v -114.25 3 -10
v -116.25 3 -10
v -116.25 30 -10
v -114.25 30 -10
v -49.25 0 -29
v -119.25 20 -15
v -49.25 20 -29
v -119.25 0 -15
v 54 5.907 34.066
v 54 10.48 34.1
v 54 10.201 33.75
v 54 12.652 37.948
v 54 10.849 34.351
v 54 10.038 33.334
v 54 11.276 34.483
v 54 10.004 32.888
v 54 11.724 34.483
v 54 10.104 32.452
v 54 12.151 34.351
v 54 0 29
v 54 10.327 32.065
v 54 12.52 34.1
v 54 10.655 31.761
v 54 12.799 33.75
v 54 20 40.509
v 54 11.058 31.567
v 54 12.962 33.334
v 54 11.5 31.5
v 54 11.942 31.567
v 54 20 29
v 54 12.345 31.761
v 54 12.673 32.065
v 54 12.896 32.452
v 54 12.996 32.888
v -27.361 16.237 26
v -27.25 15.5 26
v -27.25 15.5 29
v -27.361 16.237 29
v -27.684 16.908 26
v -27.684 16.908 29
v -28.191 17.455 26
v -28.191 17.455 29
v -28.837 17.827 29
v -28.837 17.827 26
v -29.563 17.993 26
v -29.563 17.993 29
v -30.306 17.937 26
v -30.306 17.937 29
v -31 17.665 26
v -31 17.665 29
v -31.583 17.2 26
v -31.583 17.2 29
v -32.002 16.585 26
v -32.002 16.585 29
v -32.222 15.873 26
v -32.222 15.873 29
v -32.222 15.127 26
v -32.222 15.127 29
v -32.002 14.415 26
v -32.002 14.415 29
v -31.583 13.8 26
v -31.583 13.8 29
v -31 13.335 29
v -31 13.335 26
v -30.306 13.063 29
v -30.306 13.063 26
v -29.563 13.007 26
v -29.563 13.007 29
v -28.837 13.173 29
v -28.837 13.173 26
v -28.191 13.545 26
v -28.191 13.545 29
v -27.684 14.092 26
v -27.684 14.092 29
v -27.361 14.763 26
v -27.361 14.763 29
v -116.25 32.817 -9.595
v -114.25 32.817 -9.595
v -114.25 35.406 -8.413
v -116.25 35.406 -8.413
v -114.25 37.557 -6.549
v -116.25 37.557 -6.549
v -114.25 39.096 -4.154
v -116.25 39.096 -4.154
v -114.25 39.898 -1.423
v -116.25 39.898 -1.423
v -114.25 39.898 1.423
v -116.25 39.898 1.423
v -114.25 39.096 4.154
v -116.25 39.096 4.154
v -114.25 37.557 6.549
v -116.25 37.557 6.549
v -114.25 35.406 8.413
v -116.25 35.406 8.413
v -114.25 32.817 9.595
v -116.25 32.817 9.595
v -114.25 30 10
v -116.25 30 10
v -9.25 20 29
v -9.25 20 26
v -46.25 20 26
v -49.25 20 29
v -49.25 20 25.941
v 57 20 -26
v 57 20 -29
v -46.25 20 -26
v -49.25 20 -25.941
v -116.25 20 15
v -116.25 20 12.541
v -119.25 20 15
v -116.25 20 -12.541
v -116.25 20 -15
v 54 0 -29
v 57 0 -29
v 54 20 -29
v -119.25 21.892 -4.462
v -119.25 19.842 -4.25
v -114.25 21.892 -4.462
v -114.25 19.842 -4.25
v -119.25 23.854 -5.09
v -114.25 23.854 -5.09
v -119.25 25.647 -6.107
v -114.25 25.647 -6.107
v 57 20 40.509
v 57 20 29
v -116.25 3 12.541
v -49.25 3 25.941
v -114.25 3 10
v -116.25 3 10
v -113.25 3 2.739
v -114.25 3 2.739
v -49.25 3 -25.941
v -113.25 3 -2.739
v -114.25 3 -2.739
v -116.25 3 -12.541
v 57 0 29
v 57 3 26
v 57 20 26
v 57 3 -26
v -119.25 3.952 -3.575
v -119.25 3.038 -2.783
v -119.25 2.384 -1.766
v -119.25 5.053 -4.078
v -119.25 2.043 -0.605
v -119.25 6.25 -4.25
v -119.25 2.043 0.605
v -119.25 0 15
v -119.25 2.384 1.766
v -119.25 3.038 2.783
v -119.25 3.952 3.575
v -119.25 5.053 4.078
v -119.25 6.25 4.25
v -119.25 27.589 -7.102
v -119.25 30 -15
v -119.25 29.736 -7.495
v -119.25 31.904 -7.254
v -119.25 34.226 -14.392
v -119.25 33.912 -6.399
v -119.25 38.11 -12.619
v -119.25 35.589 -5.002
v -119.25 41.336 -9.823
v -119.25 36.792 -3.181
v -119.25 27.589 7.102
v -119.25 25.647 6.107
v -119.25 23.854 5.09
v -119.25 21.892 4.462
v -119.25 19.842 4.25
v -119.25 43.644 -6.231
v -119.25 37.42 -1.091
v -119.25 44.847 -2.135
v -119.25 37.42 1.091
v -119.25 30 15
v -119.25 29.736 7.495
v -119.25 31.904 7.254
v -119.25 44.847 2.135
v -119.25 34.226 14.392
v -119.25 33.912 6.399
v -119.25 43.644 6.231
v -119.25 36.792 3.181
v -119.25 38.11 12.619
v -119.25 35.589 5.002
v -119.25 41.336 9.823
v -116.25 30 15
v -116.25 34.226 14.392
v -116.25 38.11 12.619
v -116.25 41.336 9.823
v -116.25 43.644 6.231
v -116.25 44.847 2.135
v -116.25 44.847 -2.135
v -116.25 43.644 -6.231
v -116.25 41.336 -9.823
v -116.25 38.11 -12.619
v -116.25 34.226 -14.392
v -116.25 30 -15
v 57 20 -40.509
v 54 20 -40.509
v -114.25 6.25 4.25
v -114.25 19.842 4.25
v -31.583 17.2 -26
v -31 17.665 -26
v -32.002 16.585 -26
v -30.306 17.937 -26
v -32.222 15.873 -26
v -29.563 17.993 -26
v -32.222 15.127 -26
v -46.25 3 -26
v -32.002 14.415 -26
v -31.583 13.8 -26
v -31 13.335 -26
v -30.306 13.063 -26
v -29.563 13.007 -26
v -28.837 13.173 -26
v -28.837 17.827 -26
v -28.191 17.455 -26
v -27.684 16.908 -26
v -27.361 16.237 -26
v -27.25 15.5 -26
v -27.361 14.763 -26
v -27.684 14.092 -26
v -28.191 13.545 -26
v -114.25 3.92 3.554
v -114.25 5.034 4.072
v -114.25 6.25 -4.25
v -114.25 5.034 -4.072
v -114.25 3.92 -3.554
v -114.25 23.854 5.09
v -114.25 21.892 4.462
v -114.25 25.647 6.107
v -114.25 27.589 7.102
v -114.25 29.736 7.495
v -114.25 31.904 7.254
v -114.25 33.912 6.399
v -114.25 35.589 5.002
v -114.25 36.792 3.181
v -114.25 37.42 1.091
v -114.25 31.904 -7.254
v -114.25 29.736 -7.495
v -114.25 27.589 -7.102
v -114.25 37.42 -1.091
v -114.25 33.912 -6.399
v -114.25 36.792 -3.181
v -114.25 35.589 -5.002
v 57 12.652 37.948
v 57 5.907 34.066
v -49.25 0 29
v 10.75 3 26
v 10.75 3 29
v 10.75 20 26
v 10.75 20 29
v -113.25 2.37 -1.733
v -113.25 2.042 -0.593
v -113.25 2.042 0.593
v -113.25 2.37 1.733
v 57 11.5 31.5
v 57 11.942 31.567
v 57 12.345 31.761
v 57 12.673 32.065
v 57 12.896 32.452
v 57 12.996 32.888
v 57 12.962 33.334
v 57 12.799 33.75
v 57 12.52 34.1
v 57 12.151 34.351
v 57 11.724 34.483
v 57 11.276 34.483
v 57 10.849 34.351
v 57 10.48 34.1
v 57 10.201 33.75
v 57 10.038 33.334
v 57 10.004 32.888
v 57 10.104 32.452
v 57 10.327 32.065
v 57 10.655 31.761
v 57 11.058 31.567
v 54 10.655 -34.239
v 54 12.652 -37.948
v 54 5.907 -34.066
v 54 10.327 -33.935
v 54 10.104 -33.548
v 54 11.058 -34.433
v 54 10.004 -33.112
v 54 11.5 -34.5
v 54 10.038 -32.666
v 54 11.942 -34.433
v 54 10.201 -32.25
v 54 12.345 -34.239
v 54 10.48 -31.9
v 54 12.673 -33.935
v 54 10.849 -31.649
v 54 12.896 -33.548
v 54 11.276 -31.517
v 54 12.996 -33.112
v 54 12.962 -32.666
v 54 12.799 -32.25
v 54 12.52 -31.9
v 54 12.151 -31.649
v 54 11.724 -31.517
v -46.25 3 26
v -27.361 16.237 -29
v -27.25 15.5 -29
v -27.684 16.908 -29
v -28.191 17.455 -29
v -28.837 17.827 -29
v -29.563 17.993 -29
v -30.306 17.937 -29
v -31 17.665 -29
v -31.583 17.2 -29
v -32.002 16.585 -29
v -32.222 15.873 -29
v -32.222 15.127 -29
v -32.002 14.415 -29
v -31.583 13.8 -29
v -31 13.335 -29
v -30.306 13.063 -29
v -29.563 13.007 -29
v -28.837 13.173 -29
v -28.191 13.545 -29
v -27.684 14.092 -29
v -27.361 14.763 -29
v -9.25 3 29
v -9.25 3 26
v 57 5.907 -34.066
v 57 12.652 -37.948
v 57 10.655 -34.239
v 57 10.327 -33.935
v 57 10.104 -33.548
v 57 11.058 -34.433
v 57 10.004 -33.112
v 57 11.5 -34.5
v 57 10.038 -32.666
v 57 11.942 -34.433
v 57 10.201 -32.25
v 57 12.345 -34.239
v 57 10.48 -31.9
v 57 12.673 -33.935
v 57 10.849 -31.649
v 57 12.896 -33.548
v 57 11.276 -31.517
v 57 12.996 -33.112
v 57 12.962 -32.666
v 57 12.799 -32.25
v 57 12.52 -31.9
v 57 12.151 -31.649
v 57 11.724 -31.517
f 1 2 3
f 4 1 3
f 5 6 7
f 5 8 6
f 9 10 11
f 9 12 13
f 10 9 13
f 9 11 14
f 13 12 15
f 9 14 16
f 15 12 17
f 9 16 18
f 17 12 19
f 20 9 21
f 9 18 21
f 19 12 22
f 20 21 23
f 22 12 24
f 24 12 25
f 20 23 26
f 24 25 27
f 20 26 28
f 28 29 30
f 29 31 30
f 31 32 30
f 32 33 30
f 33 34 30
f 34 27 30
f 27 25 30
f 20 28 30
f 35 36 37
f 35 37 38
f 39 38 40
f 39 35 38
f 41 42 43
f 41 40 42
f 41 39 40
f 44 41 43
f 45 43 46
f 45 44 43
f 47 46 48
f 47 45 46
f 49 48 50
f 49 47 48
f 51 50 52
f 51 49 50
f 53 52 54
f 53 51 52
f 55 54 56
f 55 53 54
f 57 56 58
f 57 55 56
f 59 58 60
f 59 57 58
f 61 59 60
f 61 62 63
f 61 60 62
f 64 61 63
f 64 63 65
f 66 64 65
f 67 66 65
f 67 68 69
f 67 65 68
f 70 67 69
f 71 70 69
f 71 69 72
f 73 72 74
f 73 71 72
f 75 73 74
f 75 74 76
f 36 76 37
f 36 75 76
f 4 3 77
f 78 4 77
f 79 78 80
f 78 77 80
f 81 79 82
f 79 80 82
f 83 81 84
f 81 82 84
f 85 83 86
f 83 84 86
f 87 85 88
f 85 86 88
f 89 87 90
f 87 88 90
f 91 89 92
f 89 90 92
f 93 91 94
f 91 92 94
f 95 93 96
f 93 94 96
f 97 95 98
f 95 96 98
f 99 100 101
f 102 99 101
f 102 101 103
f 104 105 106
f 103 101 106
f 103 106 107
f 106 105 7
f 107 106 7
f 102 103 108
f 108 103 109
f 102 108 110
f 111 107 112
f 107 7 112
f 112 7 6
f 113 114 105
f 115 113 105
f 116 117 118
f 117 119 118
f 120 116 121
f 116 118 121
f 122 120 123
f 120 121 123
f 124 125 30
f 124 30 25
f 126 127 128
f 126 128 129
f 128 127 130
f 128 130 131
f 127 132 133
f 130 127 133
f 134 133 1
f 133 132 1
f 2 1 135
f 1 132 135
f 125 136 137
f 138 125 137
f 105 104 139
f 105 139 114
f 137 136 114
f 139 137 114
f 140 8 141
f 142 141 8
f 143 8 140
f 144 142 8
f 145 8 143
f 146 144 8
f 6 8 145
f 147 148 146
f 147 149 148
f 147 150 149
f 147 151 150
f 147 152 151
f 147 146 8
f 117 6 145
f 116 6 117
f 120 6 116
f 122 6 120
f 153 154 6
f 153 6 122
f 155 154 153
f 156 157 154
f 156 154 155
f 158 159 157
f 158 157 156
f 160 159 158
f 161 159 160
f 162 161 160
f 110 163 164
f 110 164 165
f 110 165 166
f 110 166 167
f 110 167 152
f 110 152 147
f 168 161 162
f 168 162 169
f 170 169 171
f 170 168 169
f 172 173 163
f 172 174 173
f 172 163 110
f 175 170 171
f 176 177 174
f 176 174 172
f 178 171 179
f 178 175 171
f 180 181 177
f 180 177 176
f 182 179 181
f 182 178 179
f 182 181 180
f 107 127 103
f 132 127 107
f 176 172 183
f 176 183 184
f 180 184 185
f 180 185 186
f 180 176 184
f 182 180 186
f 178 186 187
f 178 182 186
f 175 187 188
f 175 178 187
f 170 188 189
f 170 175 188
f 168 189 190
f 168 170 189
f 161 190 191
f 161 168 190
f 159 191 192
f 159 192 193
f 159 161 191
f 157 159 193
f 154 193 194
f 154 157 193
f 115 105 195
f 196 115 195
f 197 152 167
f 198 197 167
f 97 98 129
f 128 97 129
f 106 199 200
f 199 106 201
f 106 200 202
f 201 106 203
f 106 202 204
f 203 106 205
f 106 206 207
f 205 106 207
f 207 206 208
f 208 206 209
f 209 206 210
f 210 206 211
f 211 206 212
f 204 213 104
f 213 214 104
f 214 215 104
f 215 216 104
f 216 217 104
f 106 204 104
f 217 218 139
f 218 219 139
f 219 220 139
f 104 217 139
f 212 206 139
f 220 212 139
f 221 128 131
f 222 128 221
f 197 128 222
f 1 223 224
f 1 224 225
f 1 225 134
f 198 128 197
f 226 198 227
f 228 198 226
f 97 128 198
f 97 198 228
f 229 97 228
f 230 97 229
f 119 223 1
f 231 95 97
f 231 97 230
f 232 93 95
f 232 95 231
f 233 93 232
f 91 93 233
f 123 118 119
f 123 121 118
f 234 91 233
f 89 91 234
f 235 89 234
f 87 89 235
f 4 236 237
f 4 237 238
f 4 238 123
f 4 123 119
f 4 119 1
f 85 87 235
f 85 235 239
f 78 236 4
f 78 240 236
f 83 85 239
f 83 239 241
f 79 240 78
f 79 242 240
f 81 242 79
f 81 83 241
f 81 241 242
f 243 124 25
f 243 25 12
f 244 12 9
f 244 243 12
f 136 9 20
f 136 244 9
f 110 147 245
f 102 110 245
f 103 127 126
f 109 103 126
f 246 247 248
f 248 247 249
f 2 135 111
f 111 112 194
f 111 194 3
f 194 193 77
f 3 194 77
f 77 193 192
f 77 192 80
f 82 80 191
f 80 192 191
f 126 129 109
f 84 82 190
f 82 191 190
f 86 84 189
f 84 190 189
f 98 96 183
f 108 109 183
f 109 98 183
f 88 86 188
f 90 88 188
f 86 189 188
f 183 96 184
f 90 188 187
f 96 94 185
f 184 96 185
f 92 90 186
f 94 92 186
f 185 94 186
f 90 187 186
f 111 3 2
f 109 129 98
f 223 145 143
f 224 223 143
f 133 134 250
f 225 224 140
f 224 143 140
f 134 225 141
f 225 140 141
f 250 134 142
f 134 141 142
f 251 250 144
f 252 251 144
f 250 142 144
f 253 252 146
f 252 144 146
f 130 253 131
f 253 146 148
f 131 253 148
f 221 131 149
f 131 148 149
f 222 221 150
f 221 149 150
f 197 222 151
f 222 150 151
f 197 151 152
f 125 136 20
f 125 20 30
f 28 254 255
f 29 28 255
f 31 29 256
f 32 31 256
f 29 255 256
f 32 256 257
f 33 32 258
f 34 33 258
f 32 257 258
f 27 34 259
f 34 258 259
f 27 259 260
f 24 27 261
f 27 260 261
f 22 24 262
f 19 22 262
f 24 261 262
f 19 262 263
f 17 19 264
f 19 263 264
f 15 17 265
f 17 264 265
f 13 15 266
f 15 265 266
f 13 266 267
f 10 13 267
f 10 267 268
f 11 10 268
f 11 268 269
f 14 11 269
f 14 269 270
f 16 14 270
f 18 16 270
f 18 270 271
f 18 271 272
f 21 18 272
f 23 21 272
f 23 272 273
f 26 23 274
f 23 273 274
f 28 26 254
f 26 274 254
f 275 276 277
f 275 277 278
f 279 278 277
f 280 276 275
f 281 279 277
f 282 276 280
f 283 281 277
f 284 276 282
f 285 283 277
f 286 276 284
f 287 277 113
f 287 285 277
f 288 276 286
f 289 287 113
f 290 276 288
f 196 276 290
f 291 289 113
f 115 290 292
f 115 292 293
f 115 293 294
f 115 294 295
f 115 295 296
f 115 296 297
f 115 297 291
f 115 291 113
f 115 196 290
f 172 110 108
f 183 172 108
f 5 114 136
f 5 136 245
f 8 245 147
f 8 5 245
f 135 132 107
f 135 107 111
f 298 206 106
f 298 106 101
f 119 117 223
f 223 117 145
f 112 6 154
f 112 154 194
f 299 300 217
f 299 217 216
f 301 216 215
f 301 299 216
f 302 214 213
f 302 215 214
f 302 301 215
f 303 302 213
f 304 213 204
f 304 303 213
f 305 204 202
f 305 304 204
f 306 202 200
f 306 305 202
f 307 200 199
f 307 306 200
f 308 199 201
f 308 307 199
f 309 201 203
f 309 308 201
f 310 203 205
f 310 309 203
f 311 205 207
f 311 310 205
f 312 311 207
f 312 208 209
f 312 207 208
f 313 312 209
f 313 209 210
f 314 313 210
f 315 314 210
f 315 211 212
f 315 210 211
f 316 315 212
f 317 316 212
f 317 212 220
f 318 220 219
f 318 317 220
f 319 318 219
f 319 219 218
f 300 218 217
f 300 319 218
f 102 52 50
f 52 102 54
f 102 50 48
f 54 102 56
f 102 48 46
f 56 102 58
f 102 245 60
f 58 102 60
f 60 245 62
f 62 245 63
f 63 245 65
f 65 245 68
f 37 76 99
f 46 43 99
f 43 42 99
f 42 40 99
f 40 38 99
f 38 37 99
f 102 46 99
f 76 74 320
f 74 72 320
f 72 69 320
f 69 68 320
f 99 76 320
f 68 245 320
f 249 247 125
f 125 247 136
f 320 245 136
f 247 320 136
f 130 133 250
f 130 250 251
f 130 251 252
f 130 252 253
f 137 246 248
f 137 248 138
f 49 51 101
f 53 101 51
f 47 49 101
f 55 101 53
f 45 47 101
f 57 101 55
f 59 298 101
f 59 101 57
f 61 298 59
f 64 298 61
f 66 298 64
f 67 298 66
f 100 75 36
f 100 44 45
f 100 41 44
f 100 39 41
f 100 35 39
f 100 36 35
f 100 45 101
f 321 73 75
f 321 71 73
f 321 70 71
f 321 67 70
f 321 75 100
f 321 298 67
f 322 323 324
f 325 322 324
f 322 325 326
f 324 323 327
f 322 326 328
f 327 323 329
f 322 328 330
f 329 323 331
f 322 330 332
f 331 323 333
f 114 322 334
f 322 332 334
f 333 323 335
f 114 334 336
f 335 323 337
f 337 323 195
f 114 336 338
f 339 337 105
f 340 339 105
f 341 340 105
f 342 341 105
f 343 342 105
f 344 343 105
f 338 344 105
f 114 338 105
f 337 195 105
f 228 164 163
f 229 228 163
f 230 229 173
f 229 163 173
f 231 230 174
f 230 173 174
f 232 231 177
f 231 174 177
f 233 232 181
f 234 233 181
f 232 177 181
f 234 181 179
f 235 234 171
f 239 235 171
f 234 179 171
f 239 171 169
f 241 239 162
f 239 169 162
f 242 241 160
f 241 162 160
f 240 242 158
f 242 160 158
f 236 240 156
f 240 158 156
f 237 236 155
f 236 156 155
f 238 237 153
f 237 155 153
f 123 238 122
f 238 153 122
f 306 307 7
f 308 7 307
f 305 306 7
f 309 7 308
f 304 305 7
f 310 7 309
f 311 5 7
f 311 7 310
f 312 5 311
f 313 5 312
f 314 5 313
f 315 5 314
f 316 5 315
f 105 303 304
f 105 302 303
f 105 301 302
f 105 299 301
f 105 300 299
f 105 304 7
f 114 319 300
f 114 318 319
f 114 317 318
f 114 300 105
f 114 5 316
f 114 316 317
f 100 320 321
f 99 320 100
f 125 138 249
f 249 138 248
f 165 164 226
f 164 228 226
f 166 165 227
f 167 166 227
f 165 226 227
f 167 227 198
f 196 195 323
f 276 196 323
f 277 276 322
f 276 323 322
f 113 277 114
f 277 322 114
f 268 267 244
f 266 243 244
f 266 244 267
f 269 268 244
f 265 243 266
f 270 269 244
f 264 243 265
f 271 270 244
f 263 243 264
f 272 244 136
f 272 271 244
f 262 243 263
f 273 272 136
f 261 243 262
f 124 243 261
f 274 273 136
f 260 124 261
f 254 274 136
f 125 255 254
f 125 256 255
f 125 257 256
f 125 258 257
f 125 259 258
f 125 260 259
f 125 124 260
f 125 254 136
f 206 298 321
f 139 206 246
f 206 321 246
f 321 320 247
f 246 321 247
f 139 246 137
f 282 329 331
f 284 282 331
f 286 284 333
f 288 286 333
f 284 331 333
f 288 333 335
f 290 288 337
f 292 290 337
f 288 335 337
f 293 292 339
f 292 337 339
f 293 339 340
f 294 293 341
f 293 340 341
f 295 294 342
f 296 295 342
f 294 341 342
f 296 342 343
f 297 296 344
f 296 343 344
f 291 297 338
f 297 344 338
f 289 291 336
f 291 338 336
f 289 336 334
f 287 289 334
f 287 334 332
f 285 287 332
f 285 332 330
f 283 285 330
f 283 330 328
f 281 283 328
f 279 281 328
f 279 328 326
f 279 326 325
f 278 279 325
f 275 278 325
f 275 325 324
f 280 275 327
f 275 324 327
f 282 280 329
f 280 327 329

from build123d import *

# Parameters (mm, degrees)
SKETCH2_W               = 106.25
SKETCH2_H               = 58
BOSS_EXTRUDE1_DEPTH     = 3
SKETCH3_W               = 103.25
SKETCH3_H               = 3
BOSS_EXTRUDE2_DEPTH     = 20
SKETCH4_W               = 3
SKETCH4_H               = 30
BOSS_EXTRUDE3_DEPTH     = 30
BOSS_EXTRUDE4_DEPTH     = 17
SKETCH6_R               = 15
BOSS_EXTRUDE5_DEPTH     = 3
SKETCH19_R              = 1.5
BOSS_EXTRUDE9_DEPTH     = 2
CUT_EXTRUDE3_DEPTH      = 141.034147621
CUT_EXTRUDE3_DEPTH_BACK = 141.034147621
SKETCH10_R              = 2.5
SKETCH16_R              = 1.5
BOSS_EXTRUDE8_DEPTH     = 3
BOSS_EXTRUDE8_2_DEPTH   = 3
SKETCH18_W              = 20
SKETCH18_H              = 17
CUT_EXTRUDE5_DEPTH      = 3
SKETCH20_R              = 7.5
CUT_EXTRUDE6_DEPTH      = 6
FILLET1_R               = 10


with BuildPart() as part:
    # Sketch2 → Boss-Extrude1 (new body)
    with BuildSketch(Plane(origin=(0, 0, 0), x_dir=(1, 0, 0), z_dir=(0, 1, 0))):
        Polygon((-119.25, 15), (-49.25, 29), (-49.25, -29), (-119.25, -15), align=None)
        with Locations((3.875, 0)):
            Rectangle(SKETCH2_W, SKETCH2_H)
    extrude(amount=BOSS_EXTRUDE1_DEPTH)

    # Sketch3 → Boss-Extrude2 (add)
    with BuildSketch(Plane.XZ):
        with Locations((5.375, 27.5)):
            Rectangle(SKETCH3_W, SKETCH3_H)
        Polygon((-46.25, 29), (-49.25, 29), (-49.25, 25.940588292), (-49.25, -25.940588292), (-49.25, -29), (-46.25, -29), (-46.25, -26), (-46.25, 26), align=None)
        with Locations((5.375, -27.5)):
            Rectangle(SKETCH3_W, SKETCH3_H)
    extrude(amount=-BOSS_EXTRUDE2_DEPTH)

    # Sketch4 → Boss-Extrude3 (add)
    with BuildSketch(Plane.XZ):
        with Locations((-117.75, 0)):
            Rectangle(SKETCH4_W, SKETCH4_H)
    extrude(amount=-BOSS_EXTRUDE3_DEPTH)

    # Sketch5 → Boss-Extrude4 (add)
    with BuildSketch(Plane(origin=(0, 3, 0), x_dir=(1, 0, 0), z_dir=(0, 1, 0))):
        Polygon((-49.25, 25.940588292), (-116.25, 12.540588292), (-119.25, 15), (-49.25, 29), align=None)
        Polygon((-49.25, -25.940588292), (-116.25, -12.540588292), (-119.25, -15), (-49.25, -29), align=None)
    extrude(amount=BOSS_EXTRUDE4_DEPTH)

    # Sketch6 → Boss-Extrude5 (add)
    with BuildSketch(Plane.ZY.offset(119.25)):
        with Locations((0, 30)):
            Circle(SKETCH6_R)
    extrude(amount=-BOSS_EXTRUDE5_DEPTH)

    # Sketch19 → Boss-Extrude9 (add)
    with BuildSketch(Plane(origin=(-116.25, 0, 0), x_dir=(0, 0, -1), z_dir=(1, 0, 0))):
        with BuildLine():
            Line((-9.999999939, 30), (-9.999999939, 0))
            Line((-9.999999939, 0), (9.999999939, 0))
            Line((9.999999939, 0), (9.999999939, 30))
            ThreePointArc((9.999999939, 30), (0, 39.999999939), (-9.999999939, 30))
        make_face()
        with Locations((0, 30)):
            Circle(SKETCH19_R, mode=Mode.SUBTRACT)
    extrude(amount=BOSS_EXTRUDE9_DEPTH)

    # Sketch10 → Cut-Extrude3 (cut, two sides: drawn at the far end of the back side and taken through both)
    with BuildSketch(Plane.XY.offset(29).offset(-CUT_EXTRUDE3_DEPTH_BACK)):
        with Locations((-29.75, 15.5)):
            Circle(SKETCH10_R)
    extrude(amount=CUT_EXTRUDE3_DEPTH + CUT_EXTRUDE3_DEPTH_BACK, mode=Mode.SUBTRACT)

    # Sketch18 → Cut-Extrude5 (cut)
    with BuildSketch(Plane.XY.offset(29)):
        with Locations((0.75, 11.5)):
            Rectangle(SKETCH18_W, SKETCH18_H)
    extrude(amount=-CUT_EXTRUDE5_DEPTH, mode=Mode.SUBTRACT)

    # Sketch20 → Cut-Extrude6 (cut)
    with BuildSketch(Plane.ZY.offset(119.25)):
        with Locations((0, 30)):
            Circle(SKETCH20_R)
        with BuildLine():
            Line((-4.25, 30), (-4.25, 6.25))
            ThreePointArc((-4.25, 6.25), (0, 2), (4.25, 6.25))
            Line((4.25, 6.25), (4.25, 30))
            ThreePointArc((4.25, 30), (0, 34.25), (-4.25, 30))
        make_face()
    extrude(amount=-CUT_EXTRUDE6_DEPTH, mode=Mode.SUBTRACT)

    # Fillet1
    fillet1_edges = [part.edges().sort_by_distance(p)[0] for p in [
        (-116.75, 23.820396453, -4.25),
        (-116.75, 23.820396453, 4.25),
    ]]
    fillet(fillet1_edges, radius=FILLET1_R)


with BuildPart() as body_2:
    # Sketch16 → Boss-Extrude8 (new body)
    with BuildSketch(Plane(origin=(57, 0, 0), x_dir=(0, 0, -1), z_dir=(1, 0, 0))):
        with BuildLine():
            Line((-29, 20), (-40.509258201, 20))
            ThreePointArc((-40.509258201, 20), (-36.164682273, 9.188566698), (-29, 0))
            Line((-29, 0), (-29, 20))
        make_face()
        with Locations((-33, 11.5)):
            Circle(SKETCH16_R, mode=Mode.SUBTRACT)
    extrude(amount=-BOSS_EXTRUDE8_DEPTH)


with BuildPart() as body_3:
    # Sketch16 → Boss-Extrude8 2 (new body)
    with BuildSketch(Plane(origin=(57, 0, 0), x_dir=(0, 0, -1), z_dir=(1, 0, 0))):
        with BuildLine():
            Line((29, 20), (40.509258201, 20))
            ThreePointArc((40.509258201, 20), (36.164682273, 9.188566698), (29, 0))
            Line((29, 0), (29, 20))
        make_face()
        with Locations((33, 11.5)):
            Circle(SKETCH16_R, mode=Mode.SUBTRACT)
    extrude(amount=-BOSS_EXTRUDE8_2_DEPTH)


solid = Compound([part.part, body_2.part, body_3.part])
